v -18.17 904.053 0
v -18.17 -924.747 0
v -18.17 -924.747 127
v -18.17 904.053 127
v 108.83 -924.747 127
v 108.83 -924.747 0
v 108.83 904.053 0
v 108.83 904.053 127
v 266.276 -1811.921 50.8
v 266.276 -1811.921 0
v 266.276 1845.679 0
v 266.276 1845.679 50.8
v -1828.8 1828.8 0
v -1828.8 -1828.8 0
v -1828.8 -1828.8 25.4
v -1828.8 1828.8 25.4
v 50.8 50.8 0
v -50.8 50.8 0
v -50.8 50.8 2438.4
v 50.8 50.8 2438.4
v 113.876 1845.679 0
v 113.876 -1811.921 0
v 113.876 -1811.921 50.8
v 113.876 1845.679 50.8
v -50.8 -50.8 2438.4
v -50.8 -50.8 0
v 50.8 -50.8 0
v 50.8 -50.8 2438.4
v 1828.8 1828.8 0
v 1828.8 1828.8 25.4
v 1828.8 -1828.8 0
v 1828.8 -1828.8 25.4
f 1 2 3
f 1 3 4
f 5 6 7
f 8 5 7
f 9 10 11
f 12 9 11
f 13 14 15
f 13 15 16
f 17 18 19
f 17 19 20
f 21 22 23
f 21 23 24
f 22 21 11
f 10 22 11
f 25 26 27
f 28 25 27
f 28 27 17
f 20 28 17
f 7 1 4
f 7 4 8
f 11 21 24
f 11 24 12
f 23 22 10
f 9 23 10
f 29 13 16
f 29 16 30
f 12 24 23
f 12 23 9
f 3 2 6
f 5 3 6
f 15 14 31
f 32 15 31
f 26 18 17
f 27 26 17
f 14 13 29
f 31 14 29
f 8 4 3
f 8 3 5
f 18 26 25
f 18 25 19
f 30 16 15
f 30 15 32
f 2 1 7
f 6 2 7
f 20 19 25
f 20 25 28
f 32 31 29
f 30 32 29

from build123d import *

# Parameters (mm, degrees)
F0_W     = 127
F0_H     = 1828.8
F1_DEPTH = 127
F2_W     = 152.4
F2_H     = 3657.6
F3_DEPTH = 50.8
F4_W     = 3657.6
F4_H     = 3657.6
F5_DEPTH = 25.4
F6_W     = 101.6
F6_H     = 101.6
F7_DEPTH = 2438.4


with BuildPart() as f1:
    # F0 (on Top) → F1 (new body)
    with BuildSketch(Plane.XY):
        with Locations((45.330457, -10.347422)):
            Rectangle(F0_W, F0_H)
    extrude(amount=F1_DEPTH)


with BuildPart() as f3:
    # F2 (on Top) → F3 (new body)
    with BuildSketch(Plane.XY):
        with Locations((190.076451, 16.878754)):
            Rectangle(F2_W, F2_H)
    extrude(amount=F3_DEPTH)


with BuildPart() as f5:
    # F4 (on Top) → F5 (new body)
    with BuildSketch(Plane.XY):
        Rectangle(F4_W, F4_H)
    extrude(amount=F5_DEPTH)


with BuildPart() as f7:
    # F6 (on Top) → F7 (new body)
    with BuildSketch(Plane.XY):
        Rectangle(F6_W, F6_H)
    extrude(amount=F7_DEPTH)


solid = Compound([f1.part, f3.part, f5.part, f7.part])
